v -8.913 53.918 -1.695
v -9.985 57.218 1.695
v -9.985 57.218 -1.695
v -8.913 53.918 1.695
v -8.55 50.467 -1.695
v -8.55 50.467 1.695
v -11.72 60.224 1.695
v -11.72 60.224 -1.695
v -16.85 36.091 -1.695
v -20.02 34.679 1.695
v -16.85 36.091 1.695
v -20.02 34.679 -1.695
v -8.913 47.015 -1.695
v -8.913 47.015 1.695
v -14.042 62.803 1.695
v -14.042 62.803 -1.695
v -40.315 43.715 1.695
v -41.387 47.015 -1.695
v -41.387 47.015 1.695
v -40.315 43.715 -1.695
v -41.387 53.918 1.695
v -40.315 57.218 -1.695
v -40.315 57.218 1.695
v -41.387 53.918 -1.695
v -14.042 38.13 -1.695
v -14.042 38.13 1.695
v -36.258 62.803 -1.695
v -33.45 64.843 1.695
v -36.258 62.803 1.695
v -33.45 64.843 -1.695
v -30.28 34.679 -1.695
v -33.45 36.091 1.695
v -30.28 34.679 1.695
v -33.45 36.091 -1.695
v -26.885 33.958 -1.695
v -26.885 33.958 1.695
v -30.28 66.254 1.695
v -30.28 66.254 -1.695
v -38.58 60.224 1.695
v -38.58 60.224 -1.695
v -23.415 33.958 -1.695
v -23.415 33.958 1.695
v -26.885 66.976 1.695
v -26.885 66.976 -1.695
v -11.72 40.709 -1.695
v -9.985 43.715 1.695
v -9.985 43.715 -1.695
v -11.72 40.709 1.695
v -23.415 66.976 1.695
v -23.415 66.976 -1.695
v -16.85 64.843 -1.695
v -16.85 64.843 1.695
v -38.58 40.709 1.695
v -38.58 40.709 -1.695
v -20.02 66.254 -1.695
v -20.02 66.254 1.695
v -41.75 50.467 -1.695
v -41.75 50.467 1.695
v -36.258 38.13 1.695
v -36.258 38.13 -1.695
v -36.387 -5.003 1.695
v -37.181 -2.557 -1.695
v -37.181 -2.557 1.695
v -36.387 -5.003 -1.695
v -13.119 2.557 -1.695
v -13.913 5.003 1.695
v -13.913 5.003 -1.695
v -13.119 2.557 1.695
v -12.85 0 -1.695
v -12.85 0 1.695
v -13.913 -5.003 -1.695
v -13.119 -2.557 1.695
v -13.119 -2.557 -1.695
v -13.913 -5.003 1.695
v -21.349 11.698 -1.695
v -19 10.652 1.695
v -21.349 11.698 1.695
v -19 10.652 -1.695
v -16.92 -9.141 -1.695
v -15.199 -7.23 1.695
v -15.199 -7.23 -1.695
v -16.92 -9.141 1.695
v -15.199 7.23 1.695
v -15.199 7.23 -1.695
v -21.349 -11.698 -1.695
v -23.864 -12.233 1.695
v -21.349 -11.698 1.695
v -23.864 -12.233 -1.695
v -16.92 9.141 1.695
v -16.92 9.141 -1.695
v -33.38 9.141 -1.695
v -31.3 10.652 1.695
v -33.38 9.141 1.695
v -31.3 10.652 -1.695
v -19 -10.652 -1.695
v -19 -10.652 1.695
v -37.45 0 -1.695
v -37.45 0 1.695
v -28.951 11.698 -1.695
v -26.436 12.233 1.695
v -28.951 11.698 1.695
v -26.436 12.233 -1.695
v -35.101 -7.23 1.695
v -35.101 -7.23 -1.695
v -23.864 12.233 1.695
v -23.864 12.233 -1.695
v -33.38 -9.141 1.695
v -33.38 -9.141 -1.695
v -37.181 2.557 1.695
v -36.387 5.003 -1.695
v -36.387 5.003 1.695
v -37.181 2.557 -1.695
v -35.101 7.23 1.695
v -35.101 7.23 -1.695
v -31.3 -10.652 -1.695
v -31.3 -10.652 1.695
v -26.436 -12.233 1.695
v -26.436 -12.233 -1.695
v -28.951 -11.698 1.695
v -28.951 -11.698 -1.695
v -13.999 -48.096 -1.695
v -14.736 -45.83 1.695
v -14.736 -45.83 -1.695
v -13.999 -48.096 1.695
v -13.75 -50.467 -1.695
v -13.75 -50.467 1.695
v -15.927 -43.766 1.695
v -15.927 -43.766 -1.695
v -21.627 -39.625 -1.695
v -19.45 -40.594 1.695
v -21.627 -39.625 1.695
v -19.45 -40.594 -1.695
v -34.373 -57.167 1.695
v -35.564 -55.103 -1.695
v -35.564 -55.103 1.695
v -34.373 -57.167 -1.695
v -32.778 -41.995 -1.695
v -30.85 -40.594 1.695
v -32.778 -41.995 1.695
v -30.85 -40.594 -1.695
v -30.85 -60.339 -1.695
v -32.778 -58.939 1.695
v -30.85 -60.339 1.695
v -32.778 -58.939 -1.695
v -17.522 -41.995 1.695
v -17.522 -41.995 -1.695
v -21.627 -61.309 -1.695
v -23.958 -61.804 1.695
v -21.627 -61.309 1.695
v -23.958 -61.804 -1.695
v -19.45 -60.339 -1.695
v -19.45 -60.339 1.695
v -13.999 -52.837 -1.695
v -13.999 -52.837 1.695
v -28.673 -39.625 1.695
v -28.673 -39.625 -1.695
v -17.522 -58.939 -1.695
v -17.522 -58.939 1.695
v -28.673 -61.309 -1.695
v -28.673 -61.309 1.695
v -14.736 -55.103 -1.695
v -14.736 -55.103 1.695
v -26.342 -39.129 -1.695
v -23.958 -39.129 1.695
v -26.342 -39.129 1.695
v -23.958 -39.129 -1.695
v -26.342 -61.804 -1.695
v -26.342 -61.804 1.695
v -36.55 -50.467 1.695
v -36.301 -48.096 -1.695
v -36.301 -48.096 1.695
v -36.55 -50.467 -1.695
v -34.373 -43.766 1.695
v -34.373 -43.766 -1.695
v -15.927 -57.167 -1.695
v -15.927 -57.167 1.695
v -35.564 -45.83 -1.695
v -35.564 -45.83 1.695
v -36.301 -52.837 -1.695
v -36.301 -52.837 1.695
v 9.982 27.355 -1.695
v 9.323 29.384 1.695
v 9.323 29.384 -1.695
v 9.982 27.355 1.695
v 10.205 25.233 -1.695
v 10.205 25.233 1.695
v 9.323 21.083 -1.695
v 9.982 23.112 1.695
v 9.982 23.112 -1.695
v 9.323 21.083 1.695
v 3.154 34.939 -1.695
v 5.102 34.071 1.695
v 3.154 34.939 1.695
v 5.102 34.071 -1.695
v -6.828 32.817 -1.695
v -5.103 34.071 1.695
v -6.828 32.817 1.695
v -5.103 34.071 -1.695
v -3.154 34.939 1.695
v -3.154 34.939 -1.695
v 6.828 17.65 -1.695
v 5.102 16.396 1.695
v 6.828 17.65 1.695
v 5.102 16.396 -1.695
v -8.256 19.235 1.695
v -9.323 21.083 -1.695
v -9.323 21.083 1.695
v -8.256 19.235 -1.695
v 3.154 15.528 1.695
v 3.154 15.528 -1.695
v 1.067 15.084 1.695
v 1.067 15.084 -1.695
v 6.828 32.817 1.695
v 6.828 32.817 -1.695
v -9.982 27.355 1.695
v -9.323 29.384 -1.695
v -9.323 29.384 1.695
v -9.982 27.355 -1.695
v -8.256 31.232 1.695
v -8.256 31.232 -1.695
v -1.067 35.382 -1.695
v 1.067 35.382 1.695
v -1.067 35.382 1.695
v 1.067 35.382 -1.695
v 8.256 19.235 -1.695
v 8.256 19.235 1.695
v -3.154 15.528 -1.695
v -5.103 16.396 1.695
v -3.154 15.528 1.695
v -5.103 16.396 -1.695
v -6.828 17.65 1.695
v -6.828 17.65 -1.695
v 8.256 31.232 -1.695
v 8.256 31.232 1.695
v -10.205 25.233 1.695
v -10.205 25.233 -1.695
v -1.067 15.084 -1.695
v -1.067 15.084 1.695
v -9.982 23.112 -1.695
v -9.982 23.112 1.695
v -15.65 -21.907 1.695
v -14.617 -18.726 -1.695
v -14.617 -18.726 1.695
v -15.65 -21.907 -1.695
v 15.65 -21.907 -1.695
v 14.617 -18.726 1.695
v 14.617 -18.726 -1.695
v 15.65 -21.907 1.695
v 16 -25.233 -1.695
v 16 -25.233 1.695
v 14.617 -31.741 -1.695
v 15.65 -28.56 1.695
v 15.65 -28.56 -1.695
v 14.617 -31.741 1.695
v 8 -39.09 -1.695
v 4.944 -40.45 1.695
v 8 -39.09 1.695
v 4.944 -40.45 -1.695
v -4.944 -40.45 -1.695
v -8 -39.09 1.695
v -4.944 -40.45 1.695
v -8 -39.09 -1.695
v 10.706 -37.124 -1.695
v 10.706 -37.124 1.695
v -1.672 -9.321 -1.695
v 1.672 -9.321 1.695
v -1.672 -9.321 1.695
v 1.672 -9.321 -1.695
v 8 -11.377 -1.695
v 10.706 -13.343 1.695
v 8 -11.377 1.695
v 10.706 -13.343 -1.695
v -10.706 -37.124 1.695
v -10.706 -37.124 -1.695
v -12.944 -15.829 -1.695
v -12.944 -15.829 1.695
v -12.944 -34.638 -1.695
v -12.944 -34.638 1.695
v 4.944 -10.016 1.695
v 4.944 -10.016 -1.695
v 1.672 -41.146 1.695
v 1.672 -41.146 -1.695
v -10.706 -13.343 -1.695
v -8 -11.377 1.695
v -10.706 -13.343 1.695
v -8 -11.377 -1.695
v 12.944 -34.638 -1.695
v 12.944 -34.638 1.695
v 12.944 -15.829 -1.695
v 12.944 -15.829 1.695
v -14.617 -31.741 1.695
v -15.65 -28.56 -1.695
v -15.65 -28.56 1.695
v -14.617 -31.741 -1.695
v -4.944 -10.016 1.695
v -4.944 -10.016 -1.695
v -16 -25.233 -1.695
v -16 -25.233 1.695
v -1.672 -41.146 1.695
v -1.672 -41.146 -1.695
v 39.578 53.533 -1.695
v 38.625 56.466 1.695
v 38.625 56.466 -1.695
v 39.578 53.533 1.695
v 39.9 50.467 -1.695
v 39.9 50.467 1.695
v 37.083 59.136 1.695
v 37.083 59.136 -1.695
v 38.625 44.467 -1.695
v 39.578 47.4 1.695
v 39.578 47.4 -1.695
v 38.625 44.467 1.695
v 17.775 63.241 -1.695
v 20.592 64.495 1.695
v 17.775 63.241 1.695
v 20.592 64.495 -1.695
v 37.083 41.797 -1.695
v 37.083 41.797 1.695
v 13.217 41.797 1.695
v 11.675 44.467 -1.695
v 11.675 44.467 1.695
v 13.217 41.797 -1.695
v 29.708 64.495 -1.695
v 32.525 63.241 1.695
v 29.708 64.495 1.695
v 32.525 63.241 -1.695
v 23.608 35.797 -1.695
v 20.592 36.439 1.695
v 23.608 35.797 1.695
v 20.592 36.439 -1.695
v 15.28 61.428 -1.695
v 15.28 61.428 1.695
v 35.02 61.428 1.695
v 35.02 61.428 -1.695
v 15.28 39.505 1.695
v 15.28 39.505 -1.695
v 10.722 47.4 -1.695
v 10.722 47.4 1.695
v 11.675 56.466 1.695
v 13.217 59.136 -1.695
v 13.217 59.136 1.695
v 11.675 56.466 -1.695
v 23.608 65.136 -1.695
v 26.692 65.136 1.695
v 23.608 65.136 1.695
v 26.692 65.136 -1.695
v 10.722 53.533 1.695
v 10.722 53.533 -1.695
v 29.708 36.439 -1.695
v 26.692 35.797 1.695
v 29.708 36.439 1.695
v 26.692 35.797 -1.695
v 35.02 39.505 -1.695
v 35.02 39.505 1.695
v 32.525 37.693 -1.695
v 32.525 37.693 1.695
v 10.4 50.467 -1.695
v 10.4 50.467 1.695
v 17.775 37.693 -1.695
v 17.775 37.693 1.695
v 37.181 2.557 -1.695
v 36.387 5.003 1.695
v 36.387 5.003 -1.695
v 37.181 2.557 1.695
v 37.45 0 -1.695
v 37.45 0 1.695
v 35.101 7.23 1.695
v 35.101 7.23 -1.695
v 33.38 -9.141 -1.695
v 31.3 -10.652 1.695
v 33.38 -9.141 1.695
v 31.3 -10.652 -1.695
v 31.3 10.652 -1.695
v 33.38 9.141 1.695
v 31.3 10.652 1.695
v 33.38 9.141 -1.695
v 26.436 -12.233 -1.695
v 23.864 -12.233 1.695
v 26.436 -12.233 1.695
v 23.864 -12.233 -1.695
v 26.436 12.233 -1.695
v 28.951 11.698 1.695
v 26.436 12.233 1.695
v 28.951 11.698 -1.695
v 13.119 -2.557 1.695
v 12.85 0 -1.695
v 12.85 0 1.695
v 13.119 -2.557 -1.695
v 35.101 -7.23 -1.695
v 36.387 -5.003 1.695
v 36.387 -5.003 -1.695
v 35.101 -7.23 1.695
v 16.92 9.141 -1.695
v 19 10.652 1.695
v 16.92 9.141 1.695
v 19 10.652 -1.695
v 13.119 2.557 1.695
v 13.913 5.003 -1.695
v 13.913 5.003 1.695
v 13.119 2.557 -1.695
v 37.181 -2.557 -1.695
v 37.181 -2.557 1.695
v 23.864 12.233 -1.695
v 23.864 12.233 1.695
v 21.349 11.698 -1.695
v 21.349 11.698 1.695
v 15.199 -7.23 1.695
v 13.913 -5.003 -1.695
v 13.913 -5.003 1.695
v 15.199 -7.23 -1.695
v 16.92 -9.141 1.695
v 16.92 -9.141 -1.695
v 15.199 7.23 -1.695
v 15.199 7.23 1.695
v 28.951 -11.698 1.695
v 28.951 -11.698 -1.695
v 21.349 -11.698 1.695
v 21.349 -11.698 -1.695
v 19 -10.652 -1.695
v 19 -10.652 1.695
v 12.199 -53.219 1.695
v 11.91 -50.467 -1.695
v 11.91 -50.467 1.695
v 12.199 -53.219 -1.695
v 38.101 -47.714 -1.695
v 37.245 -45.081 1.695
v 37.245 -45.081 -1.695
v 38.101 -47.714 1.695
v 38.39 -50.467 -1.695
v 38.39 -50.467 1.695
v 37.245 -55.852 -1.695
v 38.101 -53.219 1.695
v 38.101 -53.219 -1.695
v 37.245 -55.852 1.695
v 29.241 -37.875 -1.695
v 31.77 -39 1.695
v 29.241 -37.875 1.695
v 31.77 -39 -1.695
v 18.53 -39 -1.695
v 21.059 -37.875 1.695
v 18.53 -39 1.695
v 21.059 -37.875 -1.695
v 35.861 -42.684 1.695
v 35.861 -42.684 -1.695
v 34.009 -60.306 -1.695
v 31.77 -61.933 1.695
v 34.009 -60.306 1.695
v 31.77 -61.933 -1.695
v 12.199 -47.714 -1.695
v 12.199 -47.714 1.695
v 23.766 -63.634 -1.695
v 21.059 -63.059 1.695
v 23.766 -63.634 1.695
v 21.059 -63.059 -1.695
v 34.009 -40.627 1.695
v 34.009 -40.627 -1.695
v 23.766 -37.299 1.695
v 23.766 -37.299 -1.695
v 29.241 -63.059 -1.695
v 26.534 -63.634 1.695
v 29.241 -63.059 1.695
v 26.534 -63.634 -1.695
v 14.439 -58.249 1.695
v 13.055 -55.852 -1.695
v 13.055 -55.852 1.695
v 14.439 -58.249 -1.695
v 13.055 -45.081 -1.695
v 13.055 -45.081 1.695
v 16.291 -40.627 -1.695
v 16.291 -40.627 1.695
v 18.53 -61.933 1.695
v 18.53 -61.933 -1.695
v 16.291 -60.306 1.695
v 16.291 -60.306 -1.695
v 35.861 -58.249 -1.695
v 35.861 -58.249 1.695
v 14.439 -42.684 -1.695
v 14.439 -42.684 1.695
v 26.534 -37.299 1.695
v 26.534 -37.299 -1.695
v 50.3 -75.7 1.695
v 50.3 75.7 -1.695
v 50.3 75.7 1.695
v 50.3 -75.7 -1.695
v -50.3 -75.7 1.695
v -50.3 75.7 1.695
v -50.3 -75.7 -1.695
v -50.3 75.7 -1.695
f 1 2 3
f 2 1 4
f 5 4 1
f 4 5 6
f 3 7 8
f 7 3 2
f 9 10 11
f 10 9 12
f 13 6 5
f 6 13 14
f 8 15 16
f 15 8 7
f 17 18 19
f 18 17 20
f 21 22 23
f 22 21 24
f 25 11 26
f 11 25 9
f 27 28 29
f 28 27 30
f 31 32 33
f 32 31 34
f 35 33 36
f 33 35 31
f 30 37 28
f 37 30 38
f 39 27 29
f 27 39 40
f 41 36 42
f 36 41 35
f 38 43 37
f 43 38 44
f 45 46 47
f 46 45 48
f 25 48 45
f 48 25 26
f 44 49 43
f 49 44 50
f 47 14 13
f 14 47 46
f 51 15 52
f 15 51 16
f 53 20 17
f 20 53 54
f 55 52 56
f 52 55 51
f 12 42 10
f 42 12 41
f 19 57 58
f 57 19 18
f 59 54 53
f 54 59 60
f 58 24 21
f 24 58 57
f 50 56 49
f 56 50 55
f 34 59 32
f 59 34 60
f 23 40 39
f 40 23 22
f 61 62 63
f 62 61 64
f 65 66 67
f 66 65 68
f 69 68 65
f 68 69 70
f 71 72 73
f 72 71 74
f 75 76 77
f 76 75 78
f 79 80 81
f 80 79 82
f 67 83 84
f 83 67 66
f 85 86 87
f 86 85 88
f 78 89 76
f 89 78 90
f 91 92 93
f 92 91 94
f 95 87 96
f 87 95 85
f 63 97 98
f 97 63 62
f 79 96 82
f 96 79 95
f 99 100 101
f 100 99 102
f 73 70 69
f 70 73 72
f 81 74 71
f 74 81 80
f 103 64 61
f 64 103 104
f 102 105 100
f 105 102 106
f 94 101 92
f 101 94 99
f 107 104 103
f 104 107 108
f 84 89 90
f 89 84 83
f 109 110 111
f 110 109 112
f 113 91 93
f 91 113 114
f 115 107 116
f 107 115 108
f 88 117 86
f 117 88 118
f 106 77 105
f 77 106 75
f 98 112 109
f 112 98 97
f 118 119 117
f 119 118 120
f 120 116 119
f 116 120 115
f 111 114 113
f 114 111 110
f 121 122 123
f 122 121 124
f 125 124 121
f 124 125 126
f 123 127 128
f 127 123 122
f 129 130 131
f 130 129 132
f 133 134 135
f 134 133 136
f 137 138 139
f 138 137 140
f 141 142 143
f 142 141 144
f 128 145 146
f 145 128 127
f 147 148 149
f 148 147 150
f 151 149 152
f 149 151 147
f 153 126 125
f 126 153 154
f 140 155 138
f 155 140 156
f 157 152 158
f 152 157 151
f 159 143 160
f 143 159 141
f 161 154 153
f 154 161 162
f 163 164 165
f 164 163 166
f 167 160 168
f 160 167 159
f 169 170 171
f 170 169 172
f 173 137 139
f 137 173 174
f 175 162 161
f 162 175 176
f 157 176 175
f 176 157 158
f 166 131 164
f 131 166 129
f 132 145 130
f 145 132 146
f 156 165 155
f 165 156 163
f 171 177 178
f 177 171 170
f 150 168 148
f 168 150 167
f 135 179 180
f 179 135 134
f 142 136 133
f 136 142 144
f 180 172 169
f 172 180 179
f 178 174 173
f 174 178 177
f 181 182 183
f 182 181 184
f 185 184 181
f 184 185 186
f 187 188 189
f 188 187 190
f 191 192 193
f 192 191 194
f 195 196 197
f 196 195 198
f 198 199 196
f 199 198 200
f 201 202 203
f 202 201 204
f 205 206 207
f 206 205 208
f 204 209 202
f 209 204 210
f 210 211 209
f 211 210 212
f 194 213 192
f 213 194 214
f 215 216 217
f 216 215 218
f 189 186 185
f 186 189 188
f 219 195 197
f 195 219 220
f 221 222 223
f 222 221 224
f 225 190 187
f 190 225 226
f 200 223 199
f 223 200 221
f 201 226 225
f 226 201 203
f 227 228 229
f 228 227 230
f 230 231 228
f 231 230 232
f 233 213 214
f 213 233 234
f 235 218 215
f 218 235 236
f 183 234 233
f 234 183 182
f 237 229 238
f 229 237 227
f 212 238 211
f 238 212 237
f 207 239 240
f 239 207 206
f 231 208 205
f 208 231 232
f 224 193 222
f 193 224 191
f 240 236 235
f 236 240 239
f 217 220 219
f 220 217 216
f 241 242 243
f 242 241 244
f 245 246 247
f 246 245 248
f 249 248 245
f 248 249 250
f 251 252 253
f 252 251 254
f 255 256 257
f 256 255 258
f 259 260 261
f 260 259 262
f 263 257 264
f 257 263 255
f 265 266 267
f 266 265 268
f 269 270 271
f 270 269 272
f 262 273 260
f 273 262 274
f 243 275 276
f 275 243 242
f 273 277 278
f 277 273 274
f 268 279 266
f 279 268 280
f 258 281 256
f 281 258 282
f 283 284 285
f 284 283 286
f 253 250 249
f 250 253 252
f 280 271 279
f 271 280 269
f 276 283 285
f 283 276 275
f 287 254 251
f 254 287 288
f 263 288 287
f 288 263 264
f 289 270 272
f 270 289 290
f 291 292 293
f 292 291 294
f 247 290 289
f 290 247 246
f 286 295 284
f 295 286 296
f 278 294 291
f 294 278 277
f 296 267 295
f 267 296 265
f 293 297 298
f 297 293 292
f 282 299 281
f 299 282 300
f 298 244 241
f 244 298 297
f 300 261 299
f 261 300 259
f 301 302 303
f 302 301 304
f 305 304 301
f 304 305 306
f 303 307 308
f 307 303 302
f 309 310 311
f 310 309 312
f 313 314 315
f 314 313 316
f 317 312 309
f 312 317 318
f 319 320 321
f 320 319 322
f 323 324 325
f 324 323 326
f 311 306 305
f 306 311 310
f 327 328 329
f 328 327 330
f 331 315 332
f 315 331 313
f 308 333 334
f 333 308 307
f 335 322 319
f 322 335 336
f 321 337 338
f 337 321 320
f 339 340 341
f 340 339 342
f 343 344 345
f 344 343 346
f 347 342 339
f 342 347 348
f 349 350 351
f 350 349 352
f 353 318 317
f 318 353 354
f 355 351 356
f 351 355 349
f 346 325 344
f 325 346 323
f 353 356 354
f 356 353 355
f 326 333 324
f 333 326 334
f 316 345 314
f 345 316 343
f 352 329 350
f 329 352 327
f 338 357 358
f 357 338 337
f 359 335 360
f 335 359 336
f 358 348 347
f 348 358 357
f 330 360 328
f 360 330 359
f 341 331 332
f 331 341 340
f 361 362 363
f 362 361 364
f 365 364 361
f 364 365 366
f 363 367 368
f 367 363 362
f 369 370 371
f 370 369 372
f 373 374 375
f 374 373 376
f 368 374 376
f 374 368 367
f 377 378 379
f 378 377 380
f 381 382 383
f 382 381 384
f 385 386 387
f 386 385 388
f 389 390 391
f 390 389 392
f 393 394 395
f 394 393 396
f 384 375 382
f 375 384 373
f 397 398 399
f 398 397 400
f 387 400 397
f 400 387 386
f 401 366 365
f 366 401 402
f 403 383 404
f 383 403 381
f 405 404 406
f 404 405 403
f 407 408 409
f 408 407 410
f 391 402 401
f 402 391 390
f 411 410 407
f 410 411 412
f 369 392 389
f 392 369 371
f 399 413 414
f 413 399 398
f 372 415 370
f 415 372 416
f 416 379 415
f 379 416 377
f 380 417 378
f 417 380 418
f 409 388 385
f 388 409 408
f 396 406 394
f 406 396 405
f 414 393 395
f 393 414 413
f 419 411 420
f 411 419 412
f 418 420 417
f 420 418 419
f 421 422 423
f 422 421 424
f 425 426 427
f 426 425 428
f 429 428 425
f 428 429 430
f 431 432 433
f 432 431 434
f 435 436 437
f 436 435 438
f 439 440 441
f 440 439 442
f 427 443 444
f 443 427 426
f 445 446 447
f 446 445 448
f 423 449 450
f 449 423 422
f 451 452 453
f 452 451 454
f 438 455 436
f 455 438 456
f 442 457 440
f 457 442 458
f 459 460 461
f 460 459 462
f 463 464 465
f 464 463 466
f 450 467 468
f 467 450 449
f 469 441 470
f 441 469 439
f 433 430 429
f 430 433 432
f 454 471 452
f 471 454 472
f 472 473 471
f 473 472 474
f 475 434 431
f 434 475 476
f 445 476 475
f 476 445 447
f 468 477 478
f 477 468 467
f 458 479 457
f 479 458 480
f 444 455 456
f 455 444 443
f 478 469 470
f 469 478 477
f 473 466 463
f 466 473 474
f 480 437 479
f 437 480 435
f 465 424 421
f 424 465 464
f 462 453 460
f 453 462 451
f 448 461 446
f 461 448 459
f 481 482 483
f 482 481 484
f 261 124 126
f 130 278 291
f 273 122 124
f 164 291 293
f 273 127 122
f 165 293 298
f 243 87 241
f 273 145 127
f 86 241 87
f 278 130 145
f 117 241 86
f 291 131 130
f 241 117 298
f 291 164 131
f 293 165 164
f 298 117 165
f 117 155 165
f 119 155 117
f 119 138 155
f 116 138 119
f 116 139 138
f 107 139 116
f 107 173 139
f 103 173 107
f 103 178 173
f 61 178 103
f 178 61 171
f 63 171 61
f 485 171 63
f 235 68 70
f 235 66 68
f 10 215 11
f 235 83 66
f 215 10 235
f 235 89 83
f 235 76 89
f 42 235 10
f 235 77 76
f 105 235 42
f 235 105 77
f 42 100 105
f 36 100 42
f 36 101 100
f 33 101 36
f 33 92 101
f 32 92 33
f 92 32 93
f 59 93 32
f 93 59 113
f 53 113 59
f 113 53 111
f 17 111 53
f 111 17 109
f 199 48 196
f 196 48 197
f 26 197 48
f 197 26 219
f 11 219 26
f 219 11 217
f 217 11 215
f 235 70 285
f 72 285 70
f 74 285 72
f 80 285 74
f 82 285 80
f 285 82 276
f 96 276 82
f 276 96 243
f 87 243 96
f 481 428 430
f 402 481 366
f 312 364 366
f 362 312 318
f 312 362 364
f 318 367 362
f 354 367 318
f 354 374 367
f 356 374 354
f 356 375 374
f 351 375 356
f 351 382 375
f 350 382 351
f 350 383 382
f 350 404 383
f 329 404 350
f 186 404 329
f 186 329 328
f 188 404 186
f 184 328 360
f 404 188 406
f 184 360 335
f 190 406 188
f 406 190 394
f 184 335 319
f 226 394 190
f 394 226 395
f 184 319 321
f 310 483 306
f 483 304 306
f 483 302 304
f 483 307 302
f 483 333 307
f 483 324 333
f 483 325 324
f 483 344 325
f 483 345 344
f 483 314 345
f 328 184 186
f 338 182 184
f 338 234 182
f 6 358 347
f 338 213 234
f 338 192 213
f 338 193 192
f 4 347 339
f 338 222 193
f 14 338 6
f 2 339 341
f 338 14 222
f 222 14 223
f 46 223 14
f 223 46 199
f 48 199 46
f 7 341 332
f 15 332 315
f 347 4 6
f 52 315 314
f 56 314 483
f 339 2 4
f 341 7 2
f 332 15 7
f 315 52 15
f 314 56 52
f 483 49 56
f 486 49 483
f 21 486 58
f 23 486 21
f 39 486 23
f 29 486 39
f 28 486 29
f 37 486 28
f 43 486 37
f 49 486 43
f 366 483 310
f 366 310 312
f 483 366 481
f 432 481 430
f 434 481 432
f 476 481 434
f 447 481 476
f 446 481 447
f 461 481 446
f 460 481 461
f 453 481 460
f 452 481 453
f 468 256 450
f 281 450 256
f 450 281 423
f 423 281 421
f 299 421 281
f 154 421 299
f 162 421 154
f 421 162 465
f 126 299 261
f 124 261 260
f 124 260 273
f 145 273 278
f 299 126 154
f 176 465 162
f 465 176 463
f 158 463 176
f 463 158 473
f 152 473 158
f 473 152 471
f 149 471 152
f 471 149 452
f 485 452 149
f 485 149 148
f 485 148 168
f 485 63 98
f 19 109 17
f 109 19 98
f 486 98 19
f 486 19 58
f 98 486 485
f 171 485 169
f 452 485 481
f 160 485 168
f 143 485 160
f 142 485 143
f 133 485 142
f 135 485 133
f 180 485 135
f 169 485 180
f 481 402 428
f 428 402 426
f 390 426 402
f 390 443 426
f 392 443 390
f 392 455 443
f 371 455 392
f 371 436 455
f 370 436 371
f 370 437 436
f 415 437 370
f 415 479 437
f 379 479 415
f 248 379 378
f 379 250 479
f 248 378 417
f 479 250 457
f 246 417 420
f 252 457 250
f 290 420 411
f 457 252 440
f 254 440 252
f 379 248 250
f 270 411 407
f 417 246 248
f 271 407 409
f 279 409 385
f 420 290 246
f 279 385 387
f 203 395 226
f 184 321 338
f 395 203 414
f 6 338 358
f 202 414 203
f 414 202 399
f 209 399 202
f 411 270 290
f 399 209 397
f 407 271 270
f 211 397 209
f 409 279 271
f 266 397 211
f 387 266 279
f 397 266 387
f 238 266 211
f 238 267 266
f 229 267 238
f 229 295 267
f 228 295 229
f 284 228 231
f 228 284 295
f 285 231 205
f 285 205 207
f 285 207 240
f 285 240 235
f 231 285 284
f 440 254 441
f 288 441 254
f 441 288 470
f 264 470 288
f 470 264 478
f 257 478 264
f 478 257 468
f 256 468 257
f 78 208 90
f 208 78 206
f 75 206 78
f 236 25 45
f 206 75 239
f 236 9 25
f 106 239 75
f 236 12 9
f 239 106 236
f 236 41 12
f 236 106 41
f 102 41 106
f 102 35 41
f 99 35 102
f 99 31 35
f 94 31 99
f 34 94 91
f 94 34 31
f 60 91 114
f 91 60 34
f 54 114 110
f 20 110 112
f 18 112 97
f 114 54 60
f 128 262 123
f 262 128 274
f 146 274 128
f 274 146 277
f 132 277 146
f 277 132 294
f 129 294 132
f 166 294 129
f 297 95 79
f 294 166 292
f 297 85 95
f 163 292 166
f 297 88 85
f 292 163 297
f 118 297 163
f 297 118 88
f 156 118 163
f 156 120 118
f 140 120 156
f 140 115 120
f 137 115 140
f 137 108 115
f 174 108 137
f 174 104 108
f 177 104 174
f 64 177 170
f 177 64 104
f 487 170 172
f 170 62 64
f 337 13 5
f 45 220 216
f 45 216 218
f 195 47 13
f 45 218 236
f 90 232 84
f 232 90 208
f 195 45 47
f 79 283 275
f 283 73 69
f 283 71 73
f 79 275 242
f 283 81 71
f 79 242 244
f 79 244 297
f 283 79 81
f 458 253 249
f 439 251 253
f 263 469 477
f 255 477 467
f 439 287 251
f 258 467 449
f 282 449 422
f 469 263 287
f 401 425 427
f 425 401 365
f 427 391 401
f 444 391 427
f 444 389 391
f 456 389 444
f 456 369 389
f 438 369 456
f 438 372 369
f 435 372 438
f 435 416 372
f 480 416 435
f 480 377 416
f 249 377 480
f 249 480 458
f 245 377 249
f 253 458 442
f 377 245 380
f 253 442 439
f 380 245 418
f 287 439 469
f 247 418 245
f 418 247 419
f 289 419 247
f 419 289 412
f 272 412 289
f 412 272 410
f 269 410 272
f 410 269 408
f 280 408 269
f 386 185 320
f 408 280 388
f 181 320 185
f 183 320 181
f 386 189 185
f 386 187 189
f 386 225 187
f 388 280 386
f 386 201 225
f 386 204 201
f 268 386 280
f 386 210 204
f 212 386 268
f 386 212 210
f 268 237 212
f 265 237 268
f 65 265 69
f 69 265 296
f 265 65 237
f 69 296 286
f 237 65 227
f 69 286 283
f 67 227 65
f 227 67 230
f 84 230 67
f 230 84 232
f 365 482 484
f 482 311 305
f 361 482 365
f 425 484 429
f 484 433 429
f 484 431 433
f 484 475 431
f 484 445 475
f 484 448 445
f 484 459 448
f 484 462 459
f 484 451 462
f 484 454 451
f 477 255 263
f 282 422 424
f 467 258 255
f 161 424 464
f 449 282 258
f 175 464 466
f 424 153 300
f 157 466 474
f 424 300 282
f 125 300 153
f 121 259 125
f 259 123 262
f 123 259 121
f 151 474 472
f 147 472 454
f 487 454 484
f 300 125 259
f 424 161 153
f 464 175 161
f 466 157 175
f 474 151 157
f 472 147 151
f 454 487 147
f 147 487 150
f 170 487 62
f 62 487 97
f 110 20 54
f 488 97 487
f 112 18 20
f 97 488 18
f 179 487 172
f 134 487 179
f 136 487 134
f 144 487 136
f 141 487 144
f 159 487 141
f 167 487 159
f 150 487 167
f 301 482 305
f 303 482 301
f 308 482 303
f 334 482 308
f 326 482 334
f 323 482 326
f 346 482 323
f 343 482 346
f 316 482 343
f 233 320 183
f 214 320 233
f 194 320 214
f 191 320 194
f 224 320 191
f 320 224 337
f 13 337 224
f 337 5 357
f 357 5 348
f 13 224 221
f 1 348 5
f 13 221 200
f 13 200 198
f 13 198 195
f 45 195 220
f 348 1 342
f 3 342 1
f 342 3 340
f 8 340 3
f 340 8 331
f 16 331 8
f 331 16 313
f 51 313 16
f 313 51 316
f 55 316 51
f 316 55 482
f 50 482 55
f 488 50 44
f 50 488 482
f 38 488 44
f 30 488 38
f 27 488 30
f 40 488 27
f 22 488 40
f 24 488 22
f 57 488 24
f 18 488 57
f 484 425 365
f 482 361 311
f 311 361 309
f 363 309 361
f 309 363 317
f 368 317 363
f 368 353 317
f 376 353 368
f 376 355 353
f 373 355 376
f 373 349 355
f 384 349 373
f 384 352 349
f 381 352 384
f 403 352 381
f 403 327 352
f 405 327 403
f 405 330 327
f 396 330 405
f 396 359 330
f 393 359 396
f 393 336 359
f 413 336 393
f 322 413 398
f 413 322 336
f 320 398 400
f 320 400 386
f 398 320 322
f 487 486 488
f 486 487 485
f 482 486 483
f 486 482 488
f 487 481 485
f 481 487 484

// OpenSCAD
// Coin plate for Pre-decimal Coinage
// https://en.wikipedia.org/wiki/Coins_of_the_pound_sterling
// All measurements in mm
// https://openscad.org/

// WIDTH OF PLATE - CROWN + TOLERANCE
MAX_THICK=2.89+0.5;

// 6x4' standard for photo frames - TOLERANCE
WIDTH=4*25.4-1;
HEIGHT=6*25.4-1;

// COIN DIAMETERS
COIN_WIGGLE=1;
HALF_CROWN_D=32.2;
TWO_SHILLING_D=32.3;
FLORIN_D=28.5;
ONE_SHILLING_D=23.6;
THREE_PENCE_D=21.8;
SIX_PENCE_D=19.41;
ONE_PENCE_D=31;
CROWN_D=38;
ONE_SHILLING_SC_D=23.6;
HALF_PENCE_D=25.48;

// LOCATIONS, X, Y FROM BOTTOM LEFT OF PHOTO
H = HEIGHT;
W = WIDTH;
COINS = [[HALF_CROWN_D,W/4,5*H/6],[ONE_SHILLING_D,W/4,H/2],[THREE_PENCE_D,W/4,H/6],[SIX_PENCE_D,W/2,2*H/3],[ONE_PENCE_D,W/2,1*H/3],[FLORIN_D,3*W/4,5*H/6],[ONE_SHILLING_SC_D,3*W/4,H/2],[HALF_PENCE_D,3*W/4,H/6]];

difference(){
    cube([WIDTH,HEIGHT,MAX_THICK],center = true);
    translate([-WIDTH/2,-HEIGHT/2]){
        for (i = [ 0 : len(COINS) - 1 ]) {
            coin = COINS[i];
            translate([coin[1],coin[2]]){
                cylinder(MAX_THICK+COIN_WIGGLE,d=coin[0]+COIN_WIGGLE,center=true);
            }
        }
    }
}
